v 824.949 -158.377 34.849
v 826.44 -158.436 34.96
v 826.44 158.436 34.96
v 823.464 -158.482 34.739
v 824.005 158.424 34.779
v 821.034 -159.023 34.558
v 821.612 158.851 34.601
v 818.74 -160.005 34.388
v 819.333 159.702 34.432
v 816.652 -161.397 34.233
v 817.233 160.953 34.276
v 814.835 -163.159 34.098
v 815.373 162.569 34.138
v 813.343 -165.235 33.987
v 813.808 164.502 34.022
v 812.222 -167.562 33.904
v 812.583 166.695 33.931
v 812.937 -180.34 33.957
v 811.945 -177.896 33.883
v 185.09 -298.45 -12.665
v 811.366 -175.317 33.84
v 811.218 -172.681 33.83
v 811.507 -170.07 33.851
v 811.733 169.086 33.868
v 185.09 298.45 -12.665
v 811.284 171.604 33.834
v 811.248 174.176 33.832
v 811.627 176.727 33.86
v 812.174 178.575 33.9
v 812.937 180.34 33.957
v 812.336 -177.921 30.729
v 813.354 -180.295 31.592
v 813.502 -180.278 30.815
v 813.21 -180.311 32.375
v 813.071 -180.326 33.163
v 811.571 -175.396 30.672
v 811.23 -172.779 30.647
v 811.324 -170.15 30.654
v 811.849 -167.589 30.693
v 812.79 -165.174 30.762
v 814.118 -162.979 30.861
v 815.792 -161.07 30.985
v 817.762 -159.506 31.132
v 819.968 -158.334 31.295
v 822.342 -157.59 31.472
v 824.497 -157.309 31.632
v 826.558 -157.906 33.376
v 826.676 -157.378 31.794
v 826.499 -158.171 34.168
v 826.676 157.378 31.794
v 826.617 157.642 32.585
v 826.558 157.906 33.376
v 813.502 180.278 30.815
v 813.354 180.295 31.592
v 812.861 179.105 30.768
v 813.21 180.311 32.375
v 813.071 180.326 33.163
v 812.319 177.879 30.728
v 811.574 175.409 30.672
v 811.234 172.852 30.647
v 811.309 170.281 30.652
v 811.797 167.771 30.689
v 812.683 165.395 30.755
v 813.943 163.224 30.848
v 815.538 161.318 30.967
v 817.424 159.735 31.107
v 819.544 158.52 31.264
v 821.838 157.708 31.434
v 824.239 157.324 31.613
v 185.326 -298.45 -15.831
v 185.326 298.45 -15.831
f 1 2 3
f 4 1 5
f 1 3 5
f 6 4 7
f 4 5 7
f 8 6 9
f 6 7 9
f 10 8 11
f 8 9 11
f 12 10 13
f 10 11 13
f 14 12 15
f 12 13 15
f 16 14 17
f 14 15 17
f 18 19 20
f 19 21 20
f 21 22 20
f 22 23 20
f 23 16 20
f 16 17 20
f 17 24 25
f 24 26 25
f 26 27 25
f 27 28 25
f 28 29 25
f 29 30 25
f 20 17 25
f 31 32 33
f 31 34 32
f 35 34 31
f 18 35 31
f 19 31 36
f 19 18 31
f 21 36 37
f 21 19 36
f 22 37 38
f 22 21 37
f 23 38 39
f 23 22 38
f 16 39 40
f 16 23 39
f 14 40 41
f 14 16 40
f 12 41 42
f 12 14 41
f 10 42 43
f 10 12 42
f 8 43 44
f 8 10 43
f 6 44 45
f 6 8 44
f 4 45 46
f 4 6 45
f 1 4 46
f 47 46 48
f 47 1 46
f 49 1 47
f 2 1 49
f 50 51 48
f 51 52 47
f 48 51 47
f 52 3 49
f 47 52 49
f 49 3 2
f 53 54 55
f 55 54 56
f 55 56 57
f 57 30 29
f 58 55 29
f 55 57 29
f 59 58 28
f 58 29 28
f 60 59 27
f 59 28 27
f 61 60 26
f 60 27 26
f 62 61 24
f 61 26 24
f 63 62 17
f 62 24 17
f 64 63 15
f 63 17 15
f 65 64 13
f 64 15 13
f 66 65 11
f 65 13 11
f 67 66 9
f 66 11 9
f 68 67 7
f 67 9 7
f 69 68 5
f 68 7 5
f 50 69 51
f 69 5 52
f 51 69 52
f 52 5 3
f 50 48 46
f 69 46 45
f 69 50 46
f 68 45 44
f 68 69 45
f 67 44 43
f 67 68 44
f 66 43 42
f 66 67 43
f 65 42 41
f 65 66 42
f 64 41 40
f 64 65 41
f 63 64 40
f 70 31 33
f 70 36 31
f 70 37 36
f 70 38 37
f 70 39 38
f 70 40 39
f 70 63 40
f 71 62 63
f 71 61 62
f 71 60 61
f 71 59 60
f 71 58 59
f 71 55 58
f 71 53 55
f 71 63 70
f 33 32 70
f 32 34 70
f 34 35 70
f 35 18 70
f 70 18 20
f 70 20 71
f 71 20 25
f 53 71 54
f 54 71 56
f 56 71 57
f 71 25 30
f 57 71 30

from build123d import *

# Parameters (mm, degrees)
BOSS_EXTRUDE1_DEPTH = 3.175
SKETCH2_R           = 14.2875
CUT_EXTRUDE1_DEPTH  = 837.34562622


with BuildPart() as part:
    # Sketch1 → Boss-Extrude1 (new body)
    with BuildSketch(Plane(origin=(1.950344864, 0, -26.264644174), x_dir=(-0.9972542674746705, 0, -0.07405353471346578), z_dir=(0.07405353471346578, 0, -0.9972542674746705))):
        Polygon((-183.644373355, -298.45), (-183.644373355, 298.45), (-826.760197391, 177.8), (-826.760197391, -177.8), align=None)
    extrude(amount=BOSS_EXTRUDE1_DEPTH)

    # Sketch2 → Cut-Extrude1 (cut, through all)
    with BuildSketch(Plane(origin=(825.5, 212.942802273, 150.983020837), x_dir=(1, 0, 0), z_dir=(0, 0.32191156150474026, 0.9467697431633416))):
        Circle(SKETCH2_R)
    cut_extrude1 = extrude(amount=-CUT_EXTRUDE1_DEPTH, mode=Mode.SUBTRACT)

    # Mirror1: Cut-Extrude1 across plane
    add(cut_extrude1.mirror(Plane.ZX), mode=Mode.SUBTRACT)


solid = part.part
